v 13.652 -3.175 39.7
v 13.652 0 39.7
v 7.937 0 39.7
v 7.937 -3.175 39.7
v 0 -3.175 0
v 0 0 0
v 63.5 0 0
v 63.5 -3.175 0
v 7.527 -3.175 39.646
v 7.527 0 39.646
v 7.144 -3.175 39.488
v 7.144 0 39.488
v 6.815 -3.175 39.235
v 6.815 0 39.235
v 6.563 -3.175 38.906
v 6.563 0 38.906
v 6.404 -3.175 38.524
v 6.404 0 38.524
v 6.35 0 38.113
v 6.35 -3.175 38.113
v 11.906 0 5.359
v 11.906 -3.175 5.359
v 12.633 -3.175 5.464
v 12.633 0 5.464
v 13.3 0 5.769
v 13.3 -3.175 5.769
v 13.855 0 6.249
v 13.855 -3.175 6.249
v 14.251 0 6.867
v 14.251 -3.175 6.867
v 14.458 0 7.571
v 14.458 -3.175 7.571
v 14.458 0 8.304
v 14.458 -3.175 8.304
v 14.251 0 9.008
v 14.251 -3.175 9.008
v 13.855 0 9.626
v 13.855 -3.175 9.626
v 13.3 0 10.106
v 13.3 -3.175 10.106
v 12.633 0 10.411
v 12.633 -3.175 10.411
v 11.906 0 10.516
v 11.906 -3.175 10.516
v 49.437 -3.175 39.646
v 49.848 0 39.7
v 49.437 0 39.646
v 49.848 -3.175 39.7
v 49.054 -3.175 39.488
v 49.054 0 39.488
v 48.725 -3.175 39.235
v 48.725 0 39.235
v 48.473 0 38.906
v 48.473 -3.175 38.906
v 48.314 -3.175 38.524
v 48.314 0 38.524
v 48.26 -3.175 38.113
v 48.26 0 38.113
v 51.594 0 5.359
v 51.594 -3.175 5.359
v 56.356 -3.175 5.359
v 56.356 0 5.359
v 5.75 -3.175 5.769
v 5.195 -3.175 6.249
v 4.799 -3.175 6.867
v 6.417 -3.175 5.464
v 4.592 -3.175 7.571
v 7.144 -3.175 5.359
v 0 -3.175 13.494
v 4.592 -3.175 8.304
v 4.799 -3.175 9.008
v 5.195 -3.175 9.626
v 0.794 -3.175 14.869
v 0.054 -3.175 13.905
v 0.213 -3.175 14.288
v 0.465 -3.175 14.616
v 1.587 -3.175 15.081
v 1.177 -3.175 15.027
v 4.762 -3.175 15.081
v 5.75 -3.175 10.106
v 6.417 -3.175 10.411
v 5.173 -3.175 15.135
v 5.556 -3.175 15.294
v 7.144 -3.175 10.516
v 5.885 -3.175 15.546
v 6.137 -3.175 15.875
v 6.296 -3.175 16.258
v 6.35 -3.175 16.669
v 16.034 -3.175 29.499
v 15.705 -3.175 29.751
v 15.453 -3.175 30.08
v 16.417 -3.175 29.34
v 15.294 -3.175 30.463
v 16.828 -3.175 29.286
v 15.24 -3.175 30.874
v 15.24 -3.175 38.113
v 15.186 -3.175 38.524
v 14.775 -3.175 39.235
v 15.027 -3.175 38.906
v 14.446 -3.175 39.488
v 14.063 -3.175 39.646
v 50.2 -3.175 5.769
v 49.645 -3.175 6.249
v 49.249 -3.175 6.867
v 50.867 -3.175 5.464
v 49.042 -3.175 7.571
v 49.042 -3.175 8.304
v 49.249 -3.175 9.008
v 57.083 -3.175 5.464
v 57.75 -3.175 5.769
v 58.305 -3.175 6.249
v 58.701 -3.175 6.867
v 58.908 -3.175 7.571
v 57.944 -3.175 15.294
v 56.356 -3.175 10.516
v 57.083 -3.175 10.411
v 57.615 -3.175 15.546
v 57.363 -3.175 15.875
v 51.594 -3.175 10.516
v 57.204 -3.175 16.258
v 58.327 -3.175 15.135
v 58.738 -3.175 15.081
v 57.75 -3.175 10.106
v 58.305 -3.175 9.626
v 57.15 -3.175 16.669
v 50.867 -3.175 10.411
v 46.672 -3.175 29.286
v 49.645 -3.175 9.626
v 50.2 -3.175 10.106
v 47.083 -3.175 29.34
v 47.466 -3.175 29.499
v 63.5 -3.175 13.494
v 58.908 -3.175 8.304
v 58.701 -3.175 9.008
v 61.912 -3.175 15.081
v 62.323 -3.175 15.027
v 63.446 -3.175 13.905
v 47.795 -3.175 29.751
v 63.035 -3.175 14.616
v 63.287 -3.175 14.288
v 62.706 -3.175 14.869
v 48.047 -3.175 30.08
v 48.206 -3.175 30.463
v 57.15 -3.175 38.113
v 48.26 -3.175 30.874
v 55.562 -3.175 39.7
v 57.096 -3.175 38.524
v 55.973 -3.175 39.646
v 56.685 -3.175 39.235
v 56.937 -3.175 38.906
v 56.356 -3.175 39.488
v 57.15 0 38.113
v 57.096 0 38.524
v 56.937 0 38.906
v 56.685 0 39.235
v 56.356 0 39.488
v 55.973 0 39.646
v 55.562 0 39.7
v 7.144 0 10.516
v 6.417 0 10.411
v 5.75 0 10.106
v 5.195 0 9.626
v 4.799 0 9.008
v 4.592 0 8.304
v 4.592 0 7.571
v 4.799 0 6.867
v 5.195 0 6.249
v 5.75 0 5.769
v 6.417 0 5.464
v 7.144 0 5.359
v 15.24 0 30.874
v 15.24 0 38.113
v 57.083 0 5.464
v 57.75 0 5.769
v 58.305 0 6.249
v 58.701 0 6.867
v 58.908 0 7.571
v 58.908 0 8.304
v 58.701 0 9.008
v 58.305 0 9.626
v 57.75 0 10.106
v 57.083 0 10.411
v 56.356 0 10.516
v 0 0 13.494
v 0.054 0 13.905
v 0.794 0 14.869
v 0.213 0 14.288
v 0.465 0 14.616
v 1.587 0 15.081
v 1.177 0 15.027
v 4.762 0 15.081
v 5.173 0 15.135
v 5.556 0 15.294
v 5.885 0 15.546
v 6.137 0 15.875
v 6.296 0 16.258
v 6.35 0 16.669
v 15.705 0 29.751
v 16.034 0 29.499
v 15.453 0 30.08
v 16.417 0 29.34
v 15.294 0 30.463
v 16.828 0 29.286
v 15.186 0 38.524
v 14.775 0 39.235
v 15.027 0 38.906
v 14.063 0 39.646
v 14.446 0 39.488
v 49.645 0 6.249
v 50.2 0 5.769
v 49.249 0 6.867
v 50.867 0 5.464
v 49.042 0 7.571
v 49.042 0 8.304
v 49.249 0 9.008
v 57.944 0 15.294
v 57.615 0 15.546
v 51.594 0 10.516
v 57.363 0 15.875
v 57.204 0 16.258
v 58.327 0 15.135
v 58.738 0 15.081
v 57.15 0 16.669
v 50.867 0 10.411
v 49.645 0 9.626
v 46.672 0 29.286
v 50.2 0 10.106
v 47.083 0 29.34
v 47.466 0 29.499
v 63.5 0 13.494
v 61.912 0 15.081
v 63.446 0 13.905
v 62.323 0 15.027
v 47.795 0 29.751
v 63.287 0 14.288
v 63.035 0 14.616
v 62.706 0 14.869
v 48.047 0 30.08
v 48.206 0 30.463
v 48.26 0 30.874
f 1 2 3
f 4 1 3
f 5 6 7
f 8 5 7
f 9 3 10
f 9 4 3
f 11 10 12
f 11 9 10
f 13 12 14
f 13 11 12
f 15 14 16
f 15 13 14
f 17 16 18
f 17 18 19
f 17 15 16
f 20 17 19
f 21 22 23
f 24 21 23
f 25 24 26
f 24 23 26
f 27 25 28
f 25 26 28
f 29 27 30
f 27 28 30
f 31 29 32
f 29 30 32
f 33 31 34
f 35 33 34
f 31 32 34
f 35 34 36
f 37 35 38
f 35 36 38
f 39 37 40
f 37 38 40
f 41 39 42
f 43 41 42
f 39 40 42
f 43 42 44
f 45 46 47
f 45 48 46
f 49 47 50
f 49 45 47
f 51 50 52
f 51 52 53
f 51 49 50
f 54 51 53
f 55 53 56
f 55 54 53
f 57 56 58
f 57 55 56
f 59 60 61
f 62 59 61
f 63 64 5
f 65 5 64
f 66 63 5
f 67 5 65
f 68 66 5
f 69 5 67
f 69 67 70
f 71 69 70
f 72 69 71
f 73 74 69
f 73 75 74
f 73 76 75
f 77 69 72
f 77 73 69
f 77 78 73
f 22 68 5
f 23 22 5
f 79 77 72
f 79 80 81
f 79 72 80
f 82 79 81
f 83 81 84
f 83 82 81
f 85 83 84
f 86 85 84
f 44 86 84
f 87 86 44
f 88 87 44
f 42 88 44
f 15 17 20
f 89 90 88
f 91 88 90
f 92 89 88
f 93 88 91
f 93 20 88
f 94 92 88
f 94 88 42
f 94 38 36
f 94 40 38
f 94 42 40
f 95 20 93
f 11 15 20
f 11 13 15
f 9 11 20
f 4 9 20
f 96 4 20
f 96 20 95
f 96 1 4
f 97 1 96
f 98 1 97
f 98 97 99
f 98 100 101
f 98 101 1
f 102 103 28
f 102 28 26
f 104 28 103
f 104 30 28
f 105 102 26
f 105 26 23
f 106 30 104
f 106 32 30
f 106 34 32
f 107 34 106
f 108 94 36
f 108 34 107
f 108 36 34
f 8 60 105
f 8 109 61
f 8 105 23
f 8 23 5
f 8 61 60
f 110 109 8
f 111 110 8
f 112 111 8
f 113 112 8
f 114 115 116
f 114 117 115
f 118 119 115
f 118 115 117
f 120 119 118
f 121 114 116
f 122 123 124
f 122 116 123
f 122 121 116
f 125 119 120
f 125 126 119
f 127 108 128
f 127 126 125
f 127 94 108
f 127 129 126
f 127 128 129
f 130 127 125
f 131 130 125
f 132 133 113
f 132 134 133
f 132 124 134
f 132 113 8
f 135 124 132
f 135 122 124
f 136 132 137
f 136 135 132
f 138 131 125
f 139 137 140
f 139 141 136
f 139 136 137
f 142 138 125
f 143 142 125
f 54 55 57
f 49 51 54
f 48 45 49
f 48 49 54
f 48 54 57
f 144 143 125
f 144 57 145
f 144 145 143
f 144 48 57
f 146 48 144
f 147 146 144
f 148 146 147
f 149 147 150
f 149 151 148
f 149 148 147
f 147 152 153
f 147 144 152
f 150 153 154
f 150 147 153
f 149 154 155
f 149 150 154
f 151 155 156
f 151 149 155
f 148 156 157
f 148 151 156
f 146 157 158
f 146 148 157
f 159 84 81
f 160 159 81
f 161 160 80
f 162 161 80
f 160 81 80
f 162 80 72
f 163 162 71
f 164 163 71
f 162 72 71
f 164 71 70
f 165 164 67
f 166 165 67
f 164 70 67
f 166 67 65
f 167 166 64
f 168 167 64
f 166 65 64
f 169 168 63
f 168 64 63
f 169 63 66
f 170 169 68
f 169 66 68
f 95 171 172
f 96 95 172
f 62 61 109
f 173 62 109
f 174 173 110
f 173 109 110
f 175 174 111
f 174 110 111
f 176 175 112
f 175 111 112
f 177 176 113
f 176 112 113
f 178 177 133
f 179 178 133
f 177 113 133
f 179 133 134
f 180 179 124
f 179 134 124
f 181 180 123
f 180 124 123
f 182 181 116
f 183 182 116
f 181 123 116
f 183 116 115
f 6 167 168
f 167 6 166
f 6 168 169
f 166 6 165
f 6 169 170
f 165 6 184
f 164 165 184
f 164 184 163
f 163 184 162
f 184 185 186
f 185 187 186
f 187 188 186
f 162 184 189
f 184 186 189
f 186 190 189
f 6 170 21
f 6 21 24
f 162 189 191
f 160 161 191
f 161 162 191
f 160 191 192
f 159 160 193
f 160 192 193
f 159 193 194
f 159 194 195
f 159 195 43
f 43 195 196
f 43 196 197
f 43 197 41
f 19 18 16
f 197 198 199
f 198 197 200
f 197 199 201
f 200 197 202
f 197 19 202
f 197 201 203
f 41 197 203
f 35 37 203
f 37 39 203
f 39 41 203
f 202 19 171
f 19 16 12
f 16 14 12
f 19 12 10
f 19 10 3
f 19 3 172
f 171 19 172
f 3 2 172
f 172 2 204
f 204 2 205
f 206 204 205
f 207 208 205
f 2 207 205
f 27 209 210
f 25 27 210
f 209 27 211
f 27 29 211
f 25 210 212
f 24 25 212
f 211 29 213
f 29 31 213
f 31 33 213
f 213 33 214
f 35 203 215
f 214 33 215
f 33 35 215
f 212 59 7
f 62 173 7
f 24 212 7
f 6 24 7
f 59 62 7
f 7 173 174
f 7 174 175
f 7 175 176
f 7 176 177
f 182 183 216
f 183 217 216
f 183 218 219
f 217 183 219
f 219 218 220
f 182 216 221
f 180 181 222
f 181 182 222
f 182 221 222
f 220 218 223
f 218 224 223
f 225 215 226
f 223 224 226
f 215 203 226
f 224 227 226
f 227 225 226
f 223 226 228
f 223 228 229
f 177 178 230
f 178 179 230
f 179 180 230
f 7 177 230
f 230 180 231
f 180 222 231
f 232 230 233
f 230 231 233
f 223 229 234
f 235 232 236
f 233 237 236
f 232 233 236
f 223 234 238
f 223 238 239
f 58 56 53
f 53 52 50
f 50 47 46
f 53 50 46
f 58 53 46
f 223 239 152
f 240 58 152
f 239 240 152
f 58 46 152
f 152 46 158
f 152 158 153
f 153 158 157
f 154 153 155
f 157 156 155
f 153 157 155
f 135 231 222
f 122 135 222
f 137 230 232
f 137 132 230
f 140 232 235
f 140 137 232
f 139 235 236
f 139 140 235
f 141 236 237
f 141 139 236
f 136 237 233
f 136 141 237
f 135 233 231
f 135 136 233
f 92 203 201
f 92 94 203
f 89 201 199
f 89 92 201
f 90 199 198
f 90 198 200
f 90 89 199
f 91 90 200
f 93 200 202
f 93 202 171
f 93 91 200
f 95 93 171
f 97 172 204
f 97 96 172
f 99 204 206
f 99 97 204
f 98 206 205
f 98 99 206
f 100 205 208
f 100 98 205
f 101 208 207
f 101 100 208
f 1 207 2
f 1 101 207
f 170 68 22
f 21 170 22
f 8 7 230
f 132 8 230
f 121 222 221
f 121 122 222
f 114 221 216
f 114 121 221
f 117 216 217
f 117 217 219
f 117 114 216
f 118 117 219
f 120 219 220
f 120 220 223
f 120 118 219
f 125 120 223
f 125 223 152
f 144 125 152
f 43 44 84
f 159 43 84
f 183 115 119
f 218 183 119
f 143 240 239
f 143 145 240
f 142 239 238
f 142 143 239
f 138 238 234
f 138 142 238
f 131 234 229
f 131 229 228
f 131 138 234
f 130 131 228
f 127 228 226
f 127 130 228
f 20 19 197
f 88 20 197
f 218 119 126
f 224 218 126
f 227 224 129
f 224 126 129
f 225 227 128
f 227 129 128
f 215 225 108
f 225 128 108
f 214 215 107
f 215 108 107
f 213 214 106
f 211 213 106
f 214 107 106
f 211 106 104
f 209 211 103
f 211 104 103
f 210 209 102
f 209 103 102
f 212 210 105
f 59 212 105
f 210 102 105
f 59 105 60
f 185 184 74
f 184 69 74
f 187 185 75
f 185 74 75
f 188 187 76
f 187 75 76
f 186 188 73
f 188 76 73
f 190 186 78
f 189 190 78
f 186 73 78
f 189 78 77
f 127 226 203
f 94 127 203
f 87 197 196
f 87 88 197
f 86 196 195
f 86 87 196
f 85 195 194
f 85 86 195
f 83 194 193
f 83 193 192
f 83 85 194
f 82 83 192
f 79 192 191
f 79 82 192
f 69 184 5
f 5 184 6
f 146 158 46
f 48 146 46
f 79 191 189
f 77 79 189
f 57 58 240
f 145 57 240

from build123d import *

# Parameters (mm, degrees)
F1_DEPTH = 3.175
F2_R     = 1.5875
F4_DEPTH = 3.175


with BuildPart() as f1:
    # F0 (on Front) → F1 (new body)
    with BuildSketch(Plane.XZ):
        Polygon((0, 15.08125), (0, 0), (63.5, 0), (63.5, 15.08125), (57.15, 15.08125), (57.15, 39.7002), (48.26, 39.7002), (48.26, 29.2862), (15.24, 29.2862), (15.24, 39.7002), (6.35, 39.7002), (6.35, 15.08125), align=None)
    extrude(amount=F1_DEPTH)

    # F2
    f2_edges = [f1.edges().sort_by_distance(p)[0] for p in [
        (6.35, -1.5875, 39.7002),
        (6.35, -1.5875, 15.08125),
        (0, -1.5875, 15.08125),
        (15.24, -1.5875, 39.7002),
        (48.26, -1.5875, 39.7002),
        (57.15, -1.5875, 39.7002),
        (57.15, -1.5875, 15.08125),
        (63.5, -1.5875, 15.08125),
        (48.26, -1.5875, 29.2862),
        (15.24, -1.5875, 29.2862),
    ]]
    fillet(f2_edges, radius=F2_R)

    # F3 (on face) → F4 (cut)
    with BuildSketch(Plane.XZ.offset(3.175)):
        with BuildLine():
            Line((51.59375, 5.3594), (56.35625, 5.3594))
            ThreePointArc((56.35625, 5.3594), (58.93435, 7.9375), (56.35625, 10.5156))
            Line((56.35625, 10.5156), (51.59375, 10.5156))
            ThreePointArc((51.59375, 10.5156), (49.01565, 7.9375), (51.59375, 5.3594))
        make_face()
        with BuildLine():
            Line((7.14375, 5.3594), (11.90625, 5.3594))
            ThreePointArc((11.90625, 5.3594), (14.48435, 7.9375), (11.90625, 10.5156))
            Line((11.90625, 10.5156), (7.14375, 10.5156))
            ThreePointArc((7.14375, 10.5156), (4.56565, 7.9375), (7.14375, 5.3594))
        make_face()
    extrude(amount=-F4_DEPTH, mode=Mode.SUBTRACT)


solid = f1.part
